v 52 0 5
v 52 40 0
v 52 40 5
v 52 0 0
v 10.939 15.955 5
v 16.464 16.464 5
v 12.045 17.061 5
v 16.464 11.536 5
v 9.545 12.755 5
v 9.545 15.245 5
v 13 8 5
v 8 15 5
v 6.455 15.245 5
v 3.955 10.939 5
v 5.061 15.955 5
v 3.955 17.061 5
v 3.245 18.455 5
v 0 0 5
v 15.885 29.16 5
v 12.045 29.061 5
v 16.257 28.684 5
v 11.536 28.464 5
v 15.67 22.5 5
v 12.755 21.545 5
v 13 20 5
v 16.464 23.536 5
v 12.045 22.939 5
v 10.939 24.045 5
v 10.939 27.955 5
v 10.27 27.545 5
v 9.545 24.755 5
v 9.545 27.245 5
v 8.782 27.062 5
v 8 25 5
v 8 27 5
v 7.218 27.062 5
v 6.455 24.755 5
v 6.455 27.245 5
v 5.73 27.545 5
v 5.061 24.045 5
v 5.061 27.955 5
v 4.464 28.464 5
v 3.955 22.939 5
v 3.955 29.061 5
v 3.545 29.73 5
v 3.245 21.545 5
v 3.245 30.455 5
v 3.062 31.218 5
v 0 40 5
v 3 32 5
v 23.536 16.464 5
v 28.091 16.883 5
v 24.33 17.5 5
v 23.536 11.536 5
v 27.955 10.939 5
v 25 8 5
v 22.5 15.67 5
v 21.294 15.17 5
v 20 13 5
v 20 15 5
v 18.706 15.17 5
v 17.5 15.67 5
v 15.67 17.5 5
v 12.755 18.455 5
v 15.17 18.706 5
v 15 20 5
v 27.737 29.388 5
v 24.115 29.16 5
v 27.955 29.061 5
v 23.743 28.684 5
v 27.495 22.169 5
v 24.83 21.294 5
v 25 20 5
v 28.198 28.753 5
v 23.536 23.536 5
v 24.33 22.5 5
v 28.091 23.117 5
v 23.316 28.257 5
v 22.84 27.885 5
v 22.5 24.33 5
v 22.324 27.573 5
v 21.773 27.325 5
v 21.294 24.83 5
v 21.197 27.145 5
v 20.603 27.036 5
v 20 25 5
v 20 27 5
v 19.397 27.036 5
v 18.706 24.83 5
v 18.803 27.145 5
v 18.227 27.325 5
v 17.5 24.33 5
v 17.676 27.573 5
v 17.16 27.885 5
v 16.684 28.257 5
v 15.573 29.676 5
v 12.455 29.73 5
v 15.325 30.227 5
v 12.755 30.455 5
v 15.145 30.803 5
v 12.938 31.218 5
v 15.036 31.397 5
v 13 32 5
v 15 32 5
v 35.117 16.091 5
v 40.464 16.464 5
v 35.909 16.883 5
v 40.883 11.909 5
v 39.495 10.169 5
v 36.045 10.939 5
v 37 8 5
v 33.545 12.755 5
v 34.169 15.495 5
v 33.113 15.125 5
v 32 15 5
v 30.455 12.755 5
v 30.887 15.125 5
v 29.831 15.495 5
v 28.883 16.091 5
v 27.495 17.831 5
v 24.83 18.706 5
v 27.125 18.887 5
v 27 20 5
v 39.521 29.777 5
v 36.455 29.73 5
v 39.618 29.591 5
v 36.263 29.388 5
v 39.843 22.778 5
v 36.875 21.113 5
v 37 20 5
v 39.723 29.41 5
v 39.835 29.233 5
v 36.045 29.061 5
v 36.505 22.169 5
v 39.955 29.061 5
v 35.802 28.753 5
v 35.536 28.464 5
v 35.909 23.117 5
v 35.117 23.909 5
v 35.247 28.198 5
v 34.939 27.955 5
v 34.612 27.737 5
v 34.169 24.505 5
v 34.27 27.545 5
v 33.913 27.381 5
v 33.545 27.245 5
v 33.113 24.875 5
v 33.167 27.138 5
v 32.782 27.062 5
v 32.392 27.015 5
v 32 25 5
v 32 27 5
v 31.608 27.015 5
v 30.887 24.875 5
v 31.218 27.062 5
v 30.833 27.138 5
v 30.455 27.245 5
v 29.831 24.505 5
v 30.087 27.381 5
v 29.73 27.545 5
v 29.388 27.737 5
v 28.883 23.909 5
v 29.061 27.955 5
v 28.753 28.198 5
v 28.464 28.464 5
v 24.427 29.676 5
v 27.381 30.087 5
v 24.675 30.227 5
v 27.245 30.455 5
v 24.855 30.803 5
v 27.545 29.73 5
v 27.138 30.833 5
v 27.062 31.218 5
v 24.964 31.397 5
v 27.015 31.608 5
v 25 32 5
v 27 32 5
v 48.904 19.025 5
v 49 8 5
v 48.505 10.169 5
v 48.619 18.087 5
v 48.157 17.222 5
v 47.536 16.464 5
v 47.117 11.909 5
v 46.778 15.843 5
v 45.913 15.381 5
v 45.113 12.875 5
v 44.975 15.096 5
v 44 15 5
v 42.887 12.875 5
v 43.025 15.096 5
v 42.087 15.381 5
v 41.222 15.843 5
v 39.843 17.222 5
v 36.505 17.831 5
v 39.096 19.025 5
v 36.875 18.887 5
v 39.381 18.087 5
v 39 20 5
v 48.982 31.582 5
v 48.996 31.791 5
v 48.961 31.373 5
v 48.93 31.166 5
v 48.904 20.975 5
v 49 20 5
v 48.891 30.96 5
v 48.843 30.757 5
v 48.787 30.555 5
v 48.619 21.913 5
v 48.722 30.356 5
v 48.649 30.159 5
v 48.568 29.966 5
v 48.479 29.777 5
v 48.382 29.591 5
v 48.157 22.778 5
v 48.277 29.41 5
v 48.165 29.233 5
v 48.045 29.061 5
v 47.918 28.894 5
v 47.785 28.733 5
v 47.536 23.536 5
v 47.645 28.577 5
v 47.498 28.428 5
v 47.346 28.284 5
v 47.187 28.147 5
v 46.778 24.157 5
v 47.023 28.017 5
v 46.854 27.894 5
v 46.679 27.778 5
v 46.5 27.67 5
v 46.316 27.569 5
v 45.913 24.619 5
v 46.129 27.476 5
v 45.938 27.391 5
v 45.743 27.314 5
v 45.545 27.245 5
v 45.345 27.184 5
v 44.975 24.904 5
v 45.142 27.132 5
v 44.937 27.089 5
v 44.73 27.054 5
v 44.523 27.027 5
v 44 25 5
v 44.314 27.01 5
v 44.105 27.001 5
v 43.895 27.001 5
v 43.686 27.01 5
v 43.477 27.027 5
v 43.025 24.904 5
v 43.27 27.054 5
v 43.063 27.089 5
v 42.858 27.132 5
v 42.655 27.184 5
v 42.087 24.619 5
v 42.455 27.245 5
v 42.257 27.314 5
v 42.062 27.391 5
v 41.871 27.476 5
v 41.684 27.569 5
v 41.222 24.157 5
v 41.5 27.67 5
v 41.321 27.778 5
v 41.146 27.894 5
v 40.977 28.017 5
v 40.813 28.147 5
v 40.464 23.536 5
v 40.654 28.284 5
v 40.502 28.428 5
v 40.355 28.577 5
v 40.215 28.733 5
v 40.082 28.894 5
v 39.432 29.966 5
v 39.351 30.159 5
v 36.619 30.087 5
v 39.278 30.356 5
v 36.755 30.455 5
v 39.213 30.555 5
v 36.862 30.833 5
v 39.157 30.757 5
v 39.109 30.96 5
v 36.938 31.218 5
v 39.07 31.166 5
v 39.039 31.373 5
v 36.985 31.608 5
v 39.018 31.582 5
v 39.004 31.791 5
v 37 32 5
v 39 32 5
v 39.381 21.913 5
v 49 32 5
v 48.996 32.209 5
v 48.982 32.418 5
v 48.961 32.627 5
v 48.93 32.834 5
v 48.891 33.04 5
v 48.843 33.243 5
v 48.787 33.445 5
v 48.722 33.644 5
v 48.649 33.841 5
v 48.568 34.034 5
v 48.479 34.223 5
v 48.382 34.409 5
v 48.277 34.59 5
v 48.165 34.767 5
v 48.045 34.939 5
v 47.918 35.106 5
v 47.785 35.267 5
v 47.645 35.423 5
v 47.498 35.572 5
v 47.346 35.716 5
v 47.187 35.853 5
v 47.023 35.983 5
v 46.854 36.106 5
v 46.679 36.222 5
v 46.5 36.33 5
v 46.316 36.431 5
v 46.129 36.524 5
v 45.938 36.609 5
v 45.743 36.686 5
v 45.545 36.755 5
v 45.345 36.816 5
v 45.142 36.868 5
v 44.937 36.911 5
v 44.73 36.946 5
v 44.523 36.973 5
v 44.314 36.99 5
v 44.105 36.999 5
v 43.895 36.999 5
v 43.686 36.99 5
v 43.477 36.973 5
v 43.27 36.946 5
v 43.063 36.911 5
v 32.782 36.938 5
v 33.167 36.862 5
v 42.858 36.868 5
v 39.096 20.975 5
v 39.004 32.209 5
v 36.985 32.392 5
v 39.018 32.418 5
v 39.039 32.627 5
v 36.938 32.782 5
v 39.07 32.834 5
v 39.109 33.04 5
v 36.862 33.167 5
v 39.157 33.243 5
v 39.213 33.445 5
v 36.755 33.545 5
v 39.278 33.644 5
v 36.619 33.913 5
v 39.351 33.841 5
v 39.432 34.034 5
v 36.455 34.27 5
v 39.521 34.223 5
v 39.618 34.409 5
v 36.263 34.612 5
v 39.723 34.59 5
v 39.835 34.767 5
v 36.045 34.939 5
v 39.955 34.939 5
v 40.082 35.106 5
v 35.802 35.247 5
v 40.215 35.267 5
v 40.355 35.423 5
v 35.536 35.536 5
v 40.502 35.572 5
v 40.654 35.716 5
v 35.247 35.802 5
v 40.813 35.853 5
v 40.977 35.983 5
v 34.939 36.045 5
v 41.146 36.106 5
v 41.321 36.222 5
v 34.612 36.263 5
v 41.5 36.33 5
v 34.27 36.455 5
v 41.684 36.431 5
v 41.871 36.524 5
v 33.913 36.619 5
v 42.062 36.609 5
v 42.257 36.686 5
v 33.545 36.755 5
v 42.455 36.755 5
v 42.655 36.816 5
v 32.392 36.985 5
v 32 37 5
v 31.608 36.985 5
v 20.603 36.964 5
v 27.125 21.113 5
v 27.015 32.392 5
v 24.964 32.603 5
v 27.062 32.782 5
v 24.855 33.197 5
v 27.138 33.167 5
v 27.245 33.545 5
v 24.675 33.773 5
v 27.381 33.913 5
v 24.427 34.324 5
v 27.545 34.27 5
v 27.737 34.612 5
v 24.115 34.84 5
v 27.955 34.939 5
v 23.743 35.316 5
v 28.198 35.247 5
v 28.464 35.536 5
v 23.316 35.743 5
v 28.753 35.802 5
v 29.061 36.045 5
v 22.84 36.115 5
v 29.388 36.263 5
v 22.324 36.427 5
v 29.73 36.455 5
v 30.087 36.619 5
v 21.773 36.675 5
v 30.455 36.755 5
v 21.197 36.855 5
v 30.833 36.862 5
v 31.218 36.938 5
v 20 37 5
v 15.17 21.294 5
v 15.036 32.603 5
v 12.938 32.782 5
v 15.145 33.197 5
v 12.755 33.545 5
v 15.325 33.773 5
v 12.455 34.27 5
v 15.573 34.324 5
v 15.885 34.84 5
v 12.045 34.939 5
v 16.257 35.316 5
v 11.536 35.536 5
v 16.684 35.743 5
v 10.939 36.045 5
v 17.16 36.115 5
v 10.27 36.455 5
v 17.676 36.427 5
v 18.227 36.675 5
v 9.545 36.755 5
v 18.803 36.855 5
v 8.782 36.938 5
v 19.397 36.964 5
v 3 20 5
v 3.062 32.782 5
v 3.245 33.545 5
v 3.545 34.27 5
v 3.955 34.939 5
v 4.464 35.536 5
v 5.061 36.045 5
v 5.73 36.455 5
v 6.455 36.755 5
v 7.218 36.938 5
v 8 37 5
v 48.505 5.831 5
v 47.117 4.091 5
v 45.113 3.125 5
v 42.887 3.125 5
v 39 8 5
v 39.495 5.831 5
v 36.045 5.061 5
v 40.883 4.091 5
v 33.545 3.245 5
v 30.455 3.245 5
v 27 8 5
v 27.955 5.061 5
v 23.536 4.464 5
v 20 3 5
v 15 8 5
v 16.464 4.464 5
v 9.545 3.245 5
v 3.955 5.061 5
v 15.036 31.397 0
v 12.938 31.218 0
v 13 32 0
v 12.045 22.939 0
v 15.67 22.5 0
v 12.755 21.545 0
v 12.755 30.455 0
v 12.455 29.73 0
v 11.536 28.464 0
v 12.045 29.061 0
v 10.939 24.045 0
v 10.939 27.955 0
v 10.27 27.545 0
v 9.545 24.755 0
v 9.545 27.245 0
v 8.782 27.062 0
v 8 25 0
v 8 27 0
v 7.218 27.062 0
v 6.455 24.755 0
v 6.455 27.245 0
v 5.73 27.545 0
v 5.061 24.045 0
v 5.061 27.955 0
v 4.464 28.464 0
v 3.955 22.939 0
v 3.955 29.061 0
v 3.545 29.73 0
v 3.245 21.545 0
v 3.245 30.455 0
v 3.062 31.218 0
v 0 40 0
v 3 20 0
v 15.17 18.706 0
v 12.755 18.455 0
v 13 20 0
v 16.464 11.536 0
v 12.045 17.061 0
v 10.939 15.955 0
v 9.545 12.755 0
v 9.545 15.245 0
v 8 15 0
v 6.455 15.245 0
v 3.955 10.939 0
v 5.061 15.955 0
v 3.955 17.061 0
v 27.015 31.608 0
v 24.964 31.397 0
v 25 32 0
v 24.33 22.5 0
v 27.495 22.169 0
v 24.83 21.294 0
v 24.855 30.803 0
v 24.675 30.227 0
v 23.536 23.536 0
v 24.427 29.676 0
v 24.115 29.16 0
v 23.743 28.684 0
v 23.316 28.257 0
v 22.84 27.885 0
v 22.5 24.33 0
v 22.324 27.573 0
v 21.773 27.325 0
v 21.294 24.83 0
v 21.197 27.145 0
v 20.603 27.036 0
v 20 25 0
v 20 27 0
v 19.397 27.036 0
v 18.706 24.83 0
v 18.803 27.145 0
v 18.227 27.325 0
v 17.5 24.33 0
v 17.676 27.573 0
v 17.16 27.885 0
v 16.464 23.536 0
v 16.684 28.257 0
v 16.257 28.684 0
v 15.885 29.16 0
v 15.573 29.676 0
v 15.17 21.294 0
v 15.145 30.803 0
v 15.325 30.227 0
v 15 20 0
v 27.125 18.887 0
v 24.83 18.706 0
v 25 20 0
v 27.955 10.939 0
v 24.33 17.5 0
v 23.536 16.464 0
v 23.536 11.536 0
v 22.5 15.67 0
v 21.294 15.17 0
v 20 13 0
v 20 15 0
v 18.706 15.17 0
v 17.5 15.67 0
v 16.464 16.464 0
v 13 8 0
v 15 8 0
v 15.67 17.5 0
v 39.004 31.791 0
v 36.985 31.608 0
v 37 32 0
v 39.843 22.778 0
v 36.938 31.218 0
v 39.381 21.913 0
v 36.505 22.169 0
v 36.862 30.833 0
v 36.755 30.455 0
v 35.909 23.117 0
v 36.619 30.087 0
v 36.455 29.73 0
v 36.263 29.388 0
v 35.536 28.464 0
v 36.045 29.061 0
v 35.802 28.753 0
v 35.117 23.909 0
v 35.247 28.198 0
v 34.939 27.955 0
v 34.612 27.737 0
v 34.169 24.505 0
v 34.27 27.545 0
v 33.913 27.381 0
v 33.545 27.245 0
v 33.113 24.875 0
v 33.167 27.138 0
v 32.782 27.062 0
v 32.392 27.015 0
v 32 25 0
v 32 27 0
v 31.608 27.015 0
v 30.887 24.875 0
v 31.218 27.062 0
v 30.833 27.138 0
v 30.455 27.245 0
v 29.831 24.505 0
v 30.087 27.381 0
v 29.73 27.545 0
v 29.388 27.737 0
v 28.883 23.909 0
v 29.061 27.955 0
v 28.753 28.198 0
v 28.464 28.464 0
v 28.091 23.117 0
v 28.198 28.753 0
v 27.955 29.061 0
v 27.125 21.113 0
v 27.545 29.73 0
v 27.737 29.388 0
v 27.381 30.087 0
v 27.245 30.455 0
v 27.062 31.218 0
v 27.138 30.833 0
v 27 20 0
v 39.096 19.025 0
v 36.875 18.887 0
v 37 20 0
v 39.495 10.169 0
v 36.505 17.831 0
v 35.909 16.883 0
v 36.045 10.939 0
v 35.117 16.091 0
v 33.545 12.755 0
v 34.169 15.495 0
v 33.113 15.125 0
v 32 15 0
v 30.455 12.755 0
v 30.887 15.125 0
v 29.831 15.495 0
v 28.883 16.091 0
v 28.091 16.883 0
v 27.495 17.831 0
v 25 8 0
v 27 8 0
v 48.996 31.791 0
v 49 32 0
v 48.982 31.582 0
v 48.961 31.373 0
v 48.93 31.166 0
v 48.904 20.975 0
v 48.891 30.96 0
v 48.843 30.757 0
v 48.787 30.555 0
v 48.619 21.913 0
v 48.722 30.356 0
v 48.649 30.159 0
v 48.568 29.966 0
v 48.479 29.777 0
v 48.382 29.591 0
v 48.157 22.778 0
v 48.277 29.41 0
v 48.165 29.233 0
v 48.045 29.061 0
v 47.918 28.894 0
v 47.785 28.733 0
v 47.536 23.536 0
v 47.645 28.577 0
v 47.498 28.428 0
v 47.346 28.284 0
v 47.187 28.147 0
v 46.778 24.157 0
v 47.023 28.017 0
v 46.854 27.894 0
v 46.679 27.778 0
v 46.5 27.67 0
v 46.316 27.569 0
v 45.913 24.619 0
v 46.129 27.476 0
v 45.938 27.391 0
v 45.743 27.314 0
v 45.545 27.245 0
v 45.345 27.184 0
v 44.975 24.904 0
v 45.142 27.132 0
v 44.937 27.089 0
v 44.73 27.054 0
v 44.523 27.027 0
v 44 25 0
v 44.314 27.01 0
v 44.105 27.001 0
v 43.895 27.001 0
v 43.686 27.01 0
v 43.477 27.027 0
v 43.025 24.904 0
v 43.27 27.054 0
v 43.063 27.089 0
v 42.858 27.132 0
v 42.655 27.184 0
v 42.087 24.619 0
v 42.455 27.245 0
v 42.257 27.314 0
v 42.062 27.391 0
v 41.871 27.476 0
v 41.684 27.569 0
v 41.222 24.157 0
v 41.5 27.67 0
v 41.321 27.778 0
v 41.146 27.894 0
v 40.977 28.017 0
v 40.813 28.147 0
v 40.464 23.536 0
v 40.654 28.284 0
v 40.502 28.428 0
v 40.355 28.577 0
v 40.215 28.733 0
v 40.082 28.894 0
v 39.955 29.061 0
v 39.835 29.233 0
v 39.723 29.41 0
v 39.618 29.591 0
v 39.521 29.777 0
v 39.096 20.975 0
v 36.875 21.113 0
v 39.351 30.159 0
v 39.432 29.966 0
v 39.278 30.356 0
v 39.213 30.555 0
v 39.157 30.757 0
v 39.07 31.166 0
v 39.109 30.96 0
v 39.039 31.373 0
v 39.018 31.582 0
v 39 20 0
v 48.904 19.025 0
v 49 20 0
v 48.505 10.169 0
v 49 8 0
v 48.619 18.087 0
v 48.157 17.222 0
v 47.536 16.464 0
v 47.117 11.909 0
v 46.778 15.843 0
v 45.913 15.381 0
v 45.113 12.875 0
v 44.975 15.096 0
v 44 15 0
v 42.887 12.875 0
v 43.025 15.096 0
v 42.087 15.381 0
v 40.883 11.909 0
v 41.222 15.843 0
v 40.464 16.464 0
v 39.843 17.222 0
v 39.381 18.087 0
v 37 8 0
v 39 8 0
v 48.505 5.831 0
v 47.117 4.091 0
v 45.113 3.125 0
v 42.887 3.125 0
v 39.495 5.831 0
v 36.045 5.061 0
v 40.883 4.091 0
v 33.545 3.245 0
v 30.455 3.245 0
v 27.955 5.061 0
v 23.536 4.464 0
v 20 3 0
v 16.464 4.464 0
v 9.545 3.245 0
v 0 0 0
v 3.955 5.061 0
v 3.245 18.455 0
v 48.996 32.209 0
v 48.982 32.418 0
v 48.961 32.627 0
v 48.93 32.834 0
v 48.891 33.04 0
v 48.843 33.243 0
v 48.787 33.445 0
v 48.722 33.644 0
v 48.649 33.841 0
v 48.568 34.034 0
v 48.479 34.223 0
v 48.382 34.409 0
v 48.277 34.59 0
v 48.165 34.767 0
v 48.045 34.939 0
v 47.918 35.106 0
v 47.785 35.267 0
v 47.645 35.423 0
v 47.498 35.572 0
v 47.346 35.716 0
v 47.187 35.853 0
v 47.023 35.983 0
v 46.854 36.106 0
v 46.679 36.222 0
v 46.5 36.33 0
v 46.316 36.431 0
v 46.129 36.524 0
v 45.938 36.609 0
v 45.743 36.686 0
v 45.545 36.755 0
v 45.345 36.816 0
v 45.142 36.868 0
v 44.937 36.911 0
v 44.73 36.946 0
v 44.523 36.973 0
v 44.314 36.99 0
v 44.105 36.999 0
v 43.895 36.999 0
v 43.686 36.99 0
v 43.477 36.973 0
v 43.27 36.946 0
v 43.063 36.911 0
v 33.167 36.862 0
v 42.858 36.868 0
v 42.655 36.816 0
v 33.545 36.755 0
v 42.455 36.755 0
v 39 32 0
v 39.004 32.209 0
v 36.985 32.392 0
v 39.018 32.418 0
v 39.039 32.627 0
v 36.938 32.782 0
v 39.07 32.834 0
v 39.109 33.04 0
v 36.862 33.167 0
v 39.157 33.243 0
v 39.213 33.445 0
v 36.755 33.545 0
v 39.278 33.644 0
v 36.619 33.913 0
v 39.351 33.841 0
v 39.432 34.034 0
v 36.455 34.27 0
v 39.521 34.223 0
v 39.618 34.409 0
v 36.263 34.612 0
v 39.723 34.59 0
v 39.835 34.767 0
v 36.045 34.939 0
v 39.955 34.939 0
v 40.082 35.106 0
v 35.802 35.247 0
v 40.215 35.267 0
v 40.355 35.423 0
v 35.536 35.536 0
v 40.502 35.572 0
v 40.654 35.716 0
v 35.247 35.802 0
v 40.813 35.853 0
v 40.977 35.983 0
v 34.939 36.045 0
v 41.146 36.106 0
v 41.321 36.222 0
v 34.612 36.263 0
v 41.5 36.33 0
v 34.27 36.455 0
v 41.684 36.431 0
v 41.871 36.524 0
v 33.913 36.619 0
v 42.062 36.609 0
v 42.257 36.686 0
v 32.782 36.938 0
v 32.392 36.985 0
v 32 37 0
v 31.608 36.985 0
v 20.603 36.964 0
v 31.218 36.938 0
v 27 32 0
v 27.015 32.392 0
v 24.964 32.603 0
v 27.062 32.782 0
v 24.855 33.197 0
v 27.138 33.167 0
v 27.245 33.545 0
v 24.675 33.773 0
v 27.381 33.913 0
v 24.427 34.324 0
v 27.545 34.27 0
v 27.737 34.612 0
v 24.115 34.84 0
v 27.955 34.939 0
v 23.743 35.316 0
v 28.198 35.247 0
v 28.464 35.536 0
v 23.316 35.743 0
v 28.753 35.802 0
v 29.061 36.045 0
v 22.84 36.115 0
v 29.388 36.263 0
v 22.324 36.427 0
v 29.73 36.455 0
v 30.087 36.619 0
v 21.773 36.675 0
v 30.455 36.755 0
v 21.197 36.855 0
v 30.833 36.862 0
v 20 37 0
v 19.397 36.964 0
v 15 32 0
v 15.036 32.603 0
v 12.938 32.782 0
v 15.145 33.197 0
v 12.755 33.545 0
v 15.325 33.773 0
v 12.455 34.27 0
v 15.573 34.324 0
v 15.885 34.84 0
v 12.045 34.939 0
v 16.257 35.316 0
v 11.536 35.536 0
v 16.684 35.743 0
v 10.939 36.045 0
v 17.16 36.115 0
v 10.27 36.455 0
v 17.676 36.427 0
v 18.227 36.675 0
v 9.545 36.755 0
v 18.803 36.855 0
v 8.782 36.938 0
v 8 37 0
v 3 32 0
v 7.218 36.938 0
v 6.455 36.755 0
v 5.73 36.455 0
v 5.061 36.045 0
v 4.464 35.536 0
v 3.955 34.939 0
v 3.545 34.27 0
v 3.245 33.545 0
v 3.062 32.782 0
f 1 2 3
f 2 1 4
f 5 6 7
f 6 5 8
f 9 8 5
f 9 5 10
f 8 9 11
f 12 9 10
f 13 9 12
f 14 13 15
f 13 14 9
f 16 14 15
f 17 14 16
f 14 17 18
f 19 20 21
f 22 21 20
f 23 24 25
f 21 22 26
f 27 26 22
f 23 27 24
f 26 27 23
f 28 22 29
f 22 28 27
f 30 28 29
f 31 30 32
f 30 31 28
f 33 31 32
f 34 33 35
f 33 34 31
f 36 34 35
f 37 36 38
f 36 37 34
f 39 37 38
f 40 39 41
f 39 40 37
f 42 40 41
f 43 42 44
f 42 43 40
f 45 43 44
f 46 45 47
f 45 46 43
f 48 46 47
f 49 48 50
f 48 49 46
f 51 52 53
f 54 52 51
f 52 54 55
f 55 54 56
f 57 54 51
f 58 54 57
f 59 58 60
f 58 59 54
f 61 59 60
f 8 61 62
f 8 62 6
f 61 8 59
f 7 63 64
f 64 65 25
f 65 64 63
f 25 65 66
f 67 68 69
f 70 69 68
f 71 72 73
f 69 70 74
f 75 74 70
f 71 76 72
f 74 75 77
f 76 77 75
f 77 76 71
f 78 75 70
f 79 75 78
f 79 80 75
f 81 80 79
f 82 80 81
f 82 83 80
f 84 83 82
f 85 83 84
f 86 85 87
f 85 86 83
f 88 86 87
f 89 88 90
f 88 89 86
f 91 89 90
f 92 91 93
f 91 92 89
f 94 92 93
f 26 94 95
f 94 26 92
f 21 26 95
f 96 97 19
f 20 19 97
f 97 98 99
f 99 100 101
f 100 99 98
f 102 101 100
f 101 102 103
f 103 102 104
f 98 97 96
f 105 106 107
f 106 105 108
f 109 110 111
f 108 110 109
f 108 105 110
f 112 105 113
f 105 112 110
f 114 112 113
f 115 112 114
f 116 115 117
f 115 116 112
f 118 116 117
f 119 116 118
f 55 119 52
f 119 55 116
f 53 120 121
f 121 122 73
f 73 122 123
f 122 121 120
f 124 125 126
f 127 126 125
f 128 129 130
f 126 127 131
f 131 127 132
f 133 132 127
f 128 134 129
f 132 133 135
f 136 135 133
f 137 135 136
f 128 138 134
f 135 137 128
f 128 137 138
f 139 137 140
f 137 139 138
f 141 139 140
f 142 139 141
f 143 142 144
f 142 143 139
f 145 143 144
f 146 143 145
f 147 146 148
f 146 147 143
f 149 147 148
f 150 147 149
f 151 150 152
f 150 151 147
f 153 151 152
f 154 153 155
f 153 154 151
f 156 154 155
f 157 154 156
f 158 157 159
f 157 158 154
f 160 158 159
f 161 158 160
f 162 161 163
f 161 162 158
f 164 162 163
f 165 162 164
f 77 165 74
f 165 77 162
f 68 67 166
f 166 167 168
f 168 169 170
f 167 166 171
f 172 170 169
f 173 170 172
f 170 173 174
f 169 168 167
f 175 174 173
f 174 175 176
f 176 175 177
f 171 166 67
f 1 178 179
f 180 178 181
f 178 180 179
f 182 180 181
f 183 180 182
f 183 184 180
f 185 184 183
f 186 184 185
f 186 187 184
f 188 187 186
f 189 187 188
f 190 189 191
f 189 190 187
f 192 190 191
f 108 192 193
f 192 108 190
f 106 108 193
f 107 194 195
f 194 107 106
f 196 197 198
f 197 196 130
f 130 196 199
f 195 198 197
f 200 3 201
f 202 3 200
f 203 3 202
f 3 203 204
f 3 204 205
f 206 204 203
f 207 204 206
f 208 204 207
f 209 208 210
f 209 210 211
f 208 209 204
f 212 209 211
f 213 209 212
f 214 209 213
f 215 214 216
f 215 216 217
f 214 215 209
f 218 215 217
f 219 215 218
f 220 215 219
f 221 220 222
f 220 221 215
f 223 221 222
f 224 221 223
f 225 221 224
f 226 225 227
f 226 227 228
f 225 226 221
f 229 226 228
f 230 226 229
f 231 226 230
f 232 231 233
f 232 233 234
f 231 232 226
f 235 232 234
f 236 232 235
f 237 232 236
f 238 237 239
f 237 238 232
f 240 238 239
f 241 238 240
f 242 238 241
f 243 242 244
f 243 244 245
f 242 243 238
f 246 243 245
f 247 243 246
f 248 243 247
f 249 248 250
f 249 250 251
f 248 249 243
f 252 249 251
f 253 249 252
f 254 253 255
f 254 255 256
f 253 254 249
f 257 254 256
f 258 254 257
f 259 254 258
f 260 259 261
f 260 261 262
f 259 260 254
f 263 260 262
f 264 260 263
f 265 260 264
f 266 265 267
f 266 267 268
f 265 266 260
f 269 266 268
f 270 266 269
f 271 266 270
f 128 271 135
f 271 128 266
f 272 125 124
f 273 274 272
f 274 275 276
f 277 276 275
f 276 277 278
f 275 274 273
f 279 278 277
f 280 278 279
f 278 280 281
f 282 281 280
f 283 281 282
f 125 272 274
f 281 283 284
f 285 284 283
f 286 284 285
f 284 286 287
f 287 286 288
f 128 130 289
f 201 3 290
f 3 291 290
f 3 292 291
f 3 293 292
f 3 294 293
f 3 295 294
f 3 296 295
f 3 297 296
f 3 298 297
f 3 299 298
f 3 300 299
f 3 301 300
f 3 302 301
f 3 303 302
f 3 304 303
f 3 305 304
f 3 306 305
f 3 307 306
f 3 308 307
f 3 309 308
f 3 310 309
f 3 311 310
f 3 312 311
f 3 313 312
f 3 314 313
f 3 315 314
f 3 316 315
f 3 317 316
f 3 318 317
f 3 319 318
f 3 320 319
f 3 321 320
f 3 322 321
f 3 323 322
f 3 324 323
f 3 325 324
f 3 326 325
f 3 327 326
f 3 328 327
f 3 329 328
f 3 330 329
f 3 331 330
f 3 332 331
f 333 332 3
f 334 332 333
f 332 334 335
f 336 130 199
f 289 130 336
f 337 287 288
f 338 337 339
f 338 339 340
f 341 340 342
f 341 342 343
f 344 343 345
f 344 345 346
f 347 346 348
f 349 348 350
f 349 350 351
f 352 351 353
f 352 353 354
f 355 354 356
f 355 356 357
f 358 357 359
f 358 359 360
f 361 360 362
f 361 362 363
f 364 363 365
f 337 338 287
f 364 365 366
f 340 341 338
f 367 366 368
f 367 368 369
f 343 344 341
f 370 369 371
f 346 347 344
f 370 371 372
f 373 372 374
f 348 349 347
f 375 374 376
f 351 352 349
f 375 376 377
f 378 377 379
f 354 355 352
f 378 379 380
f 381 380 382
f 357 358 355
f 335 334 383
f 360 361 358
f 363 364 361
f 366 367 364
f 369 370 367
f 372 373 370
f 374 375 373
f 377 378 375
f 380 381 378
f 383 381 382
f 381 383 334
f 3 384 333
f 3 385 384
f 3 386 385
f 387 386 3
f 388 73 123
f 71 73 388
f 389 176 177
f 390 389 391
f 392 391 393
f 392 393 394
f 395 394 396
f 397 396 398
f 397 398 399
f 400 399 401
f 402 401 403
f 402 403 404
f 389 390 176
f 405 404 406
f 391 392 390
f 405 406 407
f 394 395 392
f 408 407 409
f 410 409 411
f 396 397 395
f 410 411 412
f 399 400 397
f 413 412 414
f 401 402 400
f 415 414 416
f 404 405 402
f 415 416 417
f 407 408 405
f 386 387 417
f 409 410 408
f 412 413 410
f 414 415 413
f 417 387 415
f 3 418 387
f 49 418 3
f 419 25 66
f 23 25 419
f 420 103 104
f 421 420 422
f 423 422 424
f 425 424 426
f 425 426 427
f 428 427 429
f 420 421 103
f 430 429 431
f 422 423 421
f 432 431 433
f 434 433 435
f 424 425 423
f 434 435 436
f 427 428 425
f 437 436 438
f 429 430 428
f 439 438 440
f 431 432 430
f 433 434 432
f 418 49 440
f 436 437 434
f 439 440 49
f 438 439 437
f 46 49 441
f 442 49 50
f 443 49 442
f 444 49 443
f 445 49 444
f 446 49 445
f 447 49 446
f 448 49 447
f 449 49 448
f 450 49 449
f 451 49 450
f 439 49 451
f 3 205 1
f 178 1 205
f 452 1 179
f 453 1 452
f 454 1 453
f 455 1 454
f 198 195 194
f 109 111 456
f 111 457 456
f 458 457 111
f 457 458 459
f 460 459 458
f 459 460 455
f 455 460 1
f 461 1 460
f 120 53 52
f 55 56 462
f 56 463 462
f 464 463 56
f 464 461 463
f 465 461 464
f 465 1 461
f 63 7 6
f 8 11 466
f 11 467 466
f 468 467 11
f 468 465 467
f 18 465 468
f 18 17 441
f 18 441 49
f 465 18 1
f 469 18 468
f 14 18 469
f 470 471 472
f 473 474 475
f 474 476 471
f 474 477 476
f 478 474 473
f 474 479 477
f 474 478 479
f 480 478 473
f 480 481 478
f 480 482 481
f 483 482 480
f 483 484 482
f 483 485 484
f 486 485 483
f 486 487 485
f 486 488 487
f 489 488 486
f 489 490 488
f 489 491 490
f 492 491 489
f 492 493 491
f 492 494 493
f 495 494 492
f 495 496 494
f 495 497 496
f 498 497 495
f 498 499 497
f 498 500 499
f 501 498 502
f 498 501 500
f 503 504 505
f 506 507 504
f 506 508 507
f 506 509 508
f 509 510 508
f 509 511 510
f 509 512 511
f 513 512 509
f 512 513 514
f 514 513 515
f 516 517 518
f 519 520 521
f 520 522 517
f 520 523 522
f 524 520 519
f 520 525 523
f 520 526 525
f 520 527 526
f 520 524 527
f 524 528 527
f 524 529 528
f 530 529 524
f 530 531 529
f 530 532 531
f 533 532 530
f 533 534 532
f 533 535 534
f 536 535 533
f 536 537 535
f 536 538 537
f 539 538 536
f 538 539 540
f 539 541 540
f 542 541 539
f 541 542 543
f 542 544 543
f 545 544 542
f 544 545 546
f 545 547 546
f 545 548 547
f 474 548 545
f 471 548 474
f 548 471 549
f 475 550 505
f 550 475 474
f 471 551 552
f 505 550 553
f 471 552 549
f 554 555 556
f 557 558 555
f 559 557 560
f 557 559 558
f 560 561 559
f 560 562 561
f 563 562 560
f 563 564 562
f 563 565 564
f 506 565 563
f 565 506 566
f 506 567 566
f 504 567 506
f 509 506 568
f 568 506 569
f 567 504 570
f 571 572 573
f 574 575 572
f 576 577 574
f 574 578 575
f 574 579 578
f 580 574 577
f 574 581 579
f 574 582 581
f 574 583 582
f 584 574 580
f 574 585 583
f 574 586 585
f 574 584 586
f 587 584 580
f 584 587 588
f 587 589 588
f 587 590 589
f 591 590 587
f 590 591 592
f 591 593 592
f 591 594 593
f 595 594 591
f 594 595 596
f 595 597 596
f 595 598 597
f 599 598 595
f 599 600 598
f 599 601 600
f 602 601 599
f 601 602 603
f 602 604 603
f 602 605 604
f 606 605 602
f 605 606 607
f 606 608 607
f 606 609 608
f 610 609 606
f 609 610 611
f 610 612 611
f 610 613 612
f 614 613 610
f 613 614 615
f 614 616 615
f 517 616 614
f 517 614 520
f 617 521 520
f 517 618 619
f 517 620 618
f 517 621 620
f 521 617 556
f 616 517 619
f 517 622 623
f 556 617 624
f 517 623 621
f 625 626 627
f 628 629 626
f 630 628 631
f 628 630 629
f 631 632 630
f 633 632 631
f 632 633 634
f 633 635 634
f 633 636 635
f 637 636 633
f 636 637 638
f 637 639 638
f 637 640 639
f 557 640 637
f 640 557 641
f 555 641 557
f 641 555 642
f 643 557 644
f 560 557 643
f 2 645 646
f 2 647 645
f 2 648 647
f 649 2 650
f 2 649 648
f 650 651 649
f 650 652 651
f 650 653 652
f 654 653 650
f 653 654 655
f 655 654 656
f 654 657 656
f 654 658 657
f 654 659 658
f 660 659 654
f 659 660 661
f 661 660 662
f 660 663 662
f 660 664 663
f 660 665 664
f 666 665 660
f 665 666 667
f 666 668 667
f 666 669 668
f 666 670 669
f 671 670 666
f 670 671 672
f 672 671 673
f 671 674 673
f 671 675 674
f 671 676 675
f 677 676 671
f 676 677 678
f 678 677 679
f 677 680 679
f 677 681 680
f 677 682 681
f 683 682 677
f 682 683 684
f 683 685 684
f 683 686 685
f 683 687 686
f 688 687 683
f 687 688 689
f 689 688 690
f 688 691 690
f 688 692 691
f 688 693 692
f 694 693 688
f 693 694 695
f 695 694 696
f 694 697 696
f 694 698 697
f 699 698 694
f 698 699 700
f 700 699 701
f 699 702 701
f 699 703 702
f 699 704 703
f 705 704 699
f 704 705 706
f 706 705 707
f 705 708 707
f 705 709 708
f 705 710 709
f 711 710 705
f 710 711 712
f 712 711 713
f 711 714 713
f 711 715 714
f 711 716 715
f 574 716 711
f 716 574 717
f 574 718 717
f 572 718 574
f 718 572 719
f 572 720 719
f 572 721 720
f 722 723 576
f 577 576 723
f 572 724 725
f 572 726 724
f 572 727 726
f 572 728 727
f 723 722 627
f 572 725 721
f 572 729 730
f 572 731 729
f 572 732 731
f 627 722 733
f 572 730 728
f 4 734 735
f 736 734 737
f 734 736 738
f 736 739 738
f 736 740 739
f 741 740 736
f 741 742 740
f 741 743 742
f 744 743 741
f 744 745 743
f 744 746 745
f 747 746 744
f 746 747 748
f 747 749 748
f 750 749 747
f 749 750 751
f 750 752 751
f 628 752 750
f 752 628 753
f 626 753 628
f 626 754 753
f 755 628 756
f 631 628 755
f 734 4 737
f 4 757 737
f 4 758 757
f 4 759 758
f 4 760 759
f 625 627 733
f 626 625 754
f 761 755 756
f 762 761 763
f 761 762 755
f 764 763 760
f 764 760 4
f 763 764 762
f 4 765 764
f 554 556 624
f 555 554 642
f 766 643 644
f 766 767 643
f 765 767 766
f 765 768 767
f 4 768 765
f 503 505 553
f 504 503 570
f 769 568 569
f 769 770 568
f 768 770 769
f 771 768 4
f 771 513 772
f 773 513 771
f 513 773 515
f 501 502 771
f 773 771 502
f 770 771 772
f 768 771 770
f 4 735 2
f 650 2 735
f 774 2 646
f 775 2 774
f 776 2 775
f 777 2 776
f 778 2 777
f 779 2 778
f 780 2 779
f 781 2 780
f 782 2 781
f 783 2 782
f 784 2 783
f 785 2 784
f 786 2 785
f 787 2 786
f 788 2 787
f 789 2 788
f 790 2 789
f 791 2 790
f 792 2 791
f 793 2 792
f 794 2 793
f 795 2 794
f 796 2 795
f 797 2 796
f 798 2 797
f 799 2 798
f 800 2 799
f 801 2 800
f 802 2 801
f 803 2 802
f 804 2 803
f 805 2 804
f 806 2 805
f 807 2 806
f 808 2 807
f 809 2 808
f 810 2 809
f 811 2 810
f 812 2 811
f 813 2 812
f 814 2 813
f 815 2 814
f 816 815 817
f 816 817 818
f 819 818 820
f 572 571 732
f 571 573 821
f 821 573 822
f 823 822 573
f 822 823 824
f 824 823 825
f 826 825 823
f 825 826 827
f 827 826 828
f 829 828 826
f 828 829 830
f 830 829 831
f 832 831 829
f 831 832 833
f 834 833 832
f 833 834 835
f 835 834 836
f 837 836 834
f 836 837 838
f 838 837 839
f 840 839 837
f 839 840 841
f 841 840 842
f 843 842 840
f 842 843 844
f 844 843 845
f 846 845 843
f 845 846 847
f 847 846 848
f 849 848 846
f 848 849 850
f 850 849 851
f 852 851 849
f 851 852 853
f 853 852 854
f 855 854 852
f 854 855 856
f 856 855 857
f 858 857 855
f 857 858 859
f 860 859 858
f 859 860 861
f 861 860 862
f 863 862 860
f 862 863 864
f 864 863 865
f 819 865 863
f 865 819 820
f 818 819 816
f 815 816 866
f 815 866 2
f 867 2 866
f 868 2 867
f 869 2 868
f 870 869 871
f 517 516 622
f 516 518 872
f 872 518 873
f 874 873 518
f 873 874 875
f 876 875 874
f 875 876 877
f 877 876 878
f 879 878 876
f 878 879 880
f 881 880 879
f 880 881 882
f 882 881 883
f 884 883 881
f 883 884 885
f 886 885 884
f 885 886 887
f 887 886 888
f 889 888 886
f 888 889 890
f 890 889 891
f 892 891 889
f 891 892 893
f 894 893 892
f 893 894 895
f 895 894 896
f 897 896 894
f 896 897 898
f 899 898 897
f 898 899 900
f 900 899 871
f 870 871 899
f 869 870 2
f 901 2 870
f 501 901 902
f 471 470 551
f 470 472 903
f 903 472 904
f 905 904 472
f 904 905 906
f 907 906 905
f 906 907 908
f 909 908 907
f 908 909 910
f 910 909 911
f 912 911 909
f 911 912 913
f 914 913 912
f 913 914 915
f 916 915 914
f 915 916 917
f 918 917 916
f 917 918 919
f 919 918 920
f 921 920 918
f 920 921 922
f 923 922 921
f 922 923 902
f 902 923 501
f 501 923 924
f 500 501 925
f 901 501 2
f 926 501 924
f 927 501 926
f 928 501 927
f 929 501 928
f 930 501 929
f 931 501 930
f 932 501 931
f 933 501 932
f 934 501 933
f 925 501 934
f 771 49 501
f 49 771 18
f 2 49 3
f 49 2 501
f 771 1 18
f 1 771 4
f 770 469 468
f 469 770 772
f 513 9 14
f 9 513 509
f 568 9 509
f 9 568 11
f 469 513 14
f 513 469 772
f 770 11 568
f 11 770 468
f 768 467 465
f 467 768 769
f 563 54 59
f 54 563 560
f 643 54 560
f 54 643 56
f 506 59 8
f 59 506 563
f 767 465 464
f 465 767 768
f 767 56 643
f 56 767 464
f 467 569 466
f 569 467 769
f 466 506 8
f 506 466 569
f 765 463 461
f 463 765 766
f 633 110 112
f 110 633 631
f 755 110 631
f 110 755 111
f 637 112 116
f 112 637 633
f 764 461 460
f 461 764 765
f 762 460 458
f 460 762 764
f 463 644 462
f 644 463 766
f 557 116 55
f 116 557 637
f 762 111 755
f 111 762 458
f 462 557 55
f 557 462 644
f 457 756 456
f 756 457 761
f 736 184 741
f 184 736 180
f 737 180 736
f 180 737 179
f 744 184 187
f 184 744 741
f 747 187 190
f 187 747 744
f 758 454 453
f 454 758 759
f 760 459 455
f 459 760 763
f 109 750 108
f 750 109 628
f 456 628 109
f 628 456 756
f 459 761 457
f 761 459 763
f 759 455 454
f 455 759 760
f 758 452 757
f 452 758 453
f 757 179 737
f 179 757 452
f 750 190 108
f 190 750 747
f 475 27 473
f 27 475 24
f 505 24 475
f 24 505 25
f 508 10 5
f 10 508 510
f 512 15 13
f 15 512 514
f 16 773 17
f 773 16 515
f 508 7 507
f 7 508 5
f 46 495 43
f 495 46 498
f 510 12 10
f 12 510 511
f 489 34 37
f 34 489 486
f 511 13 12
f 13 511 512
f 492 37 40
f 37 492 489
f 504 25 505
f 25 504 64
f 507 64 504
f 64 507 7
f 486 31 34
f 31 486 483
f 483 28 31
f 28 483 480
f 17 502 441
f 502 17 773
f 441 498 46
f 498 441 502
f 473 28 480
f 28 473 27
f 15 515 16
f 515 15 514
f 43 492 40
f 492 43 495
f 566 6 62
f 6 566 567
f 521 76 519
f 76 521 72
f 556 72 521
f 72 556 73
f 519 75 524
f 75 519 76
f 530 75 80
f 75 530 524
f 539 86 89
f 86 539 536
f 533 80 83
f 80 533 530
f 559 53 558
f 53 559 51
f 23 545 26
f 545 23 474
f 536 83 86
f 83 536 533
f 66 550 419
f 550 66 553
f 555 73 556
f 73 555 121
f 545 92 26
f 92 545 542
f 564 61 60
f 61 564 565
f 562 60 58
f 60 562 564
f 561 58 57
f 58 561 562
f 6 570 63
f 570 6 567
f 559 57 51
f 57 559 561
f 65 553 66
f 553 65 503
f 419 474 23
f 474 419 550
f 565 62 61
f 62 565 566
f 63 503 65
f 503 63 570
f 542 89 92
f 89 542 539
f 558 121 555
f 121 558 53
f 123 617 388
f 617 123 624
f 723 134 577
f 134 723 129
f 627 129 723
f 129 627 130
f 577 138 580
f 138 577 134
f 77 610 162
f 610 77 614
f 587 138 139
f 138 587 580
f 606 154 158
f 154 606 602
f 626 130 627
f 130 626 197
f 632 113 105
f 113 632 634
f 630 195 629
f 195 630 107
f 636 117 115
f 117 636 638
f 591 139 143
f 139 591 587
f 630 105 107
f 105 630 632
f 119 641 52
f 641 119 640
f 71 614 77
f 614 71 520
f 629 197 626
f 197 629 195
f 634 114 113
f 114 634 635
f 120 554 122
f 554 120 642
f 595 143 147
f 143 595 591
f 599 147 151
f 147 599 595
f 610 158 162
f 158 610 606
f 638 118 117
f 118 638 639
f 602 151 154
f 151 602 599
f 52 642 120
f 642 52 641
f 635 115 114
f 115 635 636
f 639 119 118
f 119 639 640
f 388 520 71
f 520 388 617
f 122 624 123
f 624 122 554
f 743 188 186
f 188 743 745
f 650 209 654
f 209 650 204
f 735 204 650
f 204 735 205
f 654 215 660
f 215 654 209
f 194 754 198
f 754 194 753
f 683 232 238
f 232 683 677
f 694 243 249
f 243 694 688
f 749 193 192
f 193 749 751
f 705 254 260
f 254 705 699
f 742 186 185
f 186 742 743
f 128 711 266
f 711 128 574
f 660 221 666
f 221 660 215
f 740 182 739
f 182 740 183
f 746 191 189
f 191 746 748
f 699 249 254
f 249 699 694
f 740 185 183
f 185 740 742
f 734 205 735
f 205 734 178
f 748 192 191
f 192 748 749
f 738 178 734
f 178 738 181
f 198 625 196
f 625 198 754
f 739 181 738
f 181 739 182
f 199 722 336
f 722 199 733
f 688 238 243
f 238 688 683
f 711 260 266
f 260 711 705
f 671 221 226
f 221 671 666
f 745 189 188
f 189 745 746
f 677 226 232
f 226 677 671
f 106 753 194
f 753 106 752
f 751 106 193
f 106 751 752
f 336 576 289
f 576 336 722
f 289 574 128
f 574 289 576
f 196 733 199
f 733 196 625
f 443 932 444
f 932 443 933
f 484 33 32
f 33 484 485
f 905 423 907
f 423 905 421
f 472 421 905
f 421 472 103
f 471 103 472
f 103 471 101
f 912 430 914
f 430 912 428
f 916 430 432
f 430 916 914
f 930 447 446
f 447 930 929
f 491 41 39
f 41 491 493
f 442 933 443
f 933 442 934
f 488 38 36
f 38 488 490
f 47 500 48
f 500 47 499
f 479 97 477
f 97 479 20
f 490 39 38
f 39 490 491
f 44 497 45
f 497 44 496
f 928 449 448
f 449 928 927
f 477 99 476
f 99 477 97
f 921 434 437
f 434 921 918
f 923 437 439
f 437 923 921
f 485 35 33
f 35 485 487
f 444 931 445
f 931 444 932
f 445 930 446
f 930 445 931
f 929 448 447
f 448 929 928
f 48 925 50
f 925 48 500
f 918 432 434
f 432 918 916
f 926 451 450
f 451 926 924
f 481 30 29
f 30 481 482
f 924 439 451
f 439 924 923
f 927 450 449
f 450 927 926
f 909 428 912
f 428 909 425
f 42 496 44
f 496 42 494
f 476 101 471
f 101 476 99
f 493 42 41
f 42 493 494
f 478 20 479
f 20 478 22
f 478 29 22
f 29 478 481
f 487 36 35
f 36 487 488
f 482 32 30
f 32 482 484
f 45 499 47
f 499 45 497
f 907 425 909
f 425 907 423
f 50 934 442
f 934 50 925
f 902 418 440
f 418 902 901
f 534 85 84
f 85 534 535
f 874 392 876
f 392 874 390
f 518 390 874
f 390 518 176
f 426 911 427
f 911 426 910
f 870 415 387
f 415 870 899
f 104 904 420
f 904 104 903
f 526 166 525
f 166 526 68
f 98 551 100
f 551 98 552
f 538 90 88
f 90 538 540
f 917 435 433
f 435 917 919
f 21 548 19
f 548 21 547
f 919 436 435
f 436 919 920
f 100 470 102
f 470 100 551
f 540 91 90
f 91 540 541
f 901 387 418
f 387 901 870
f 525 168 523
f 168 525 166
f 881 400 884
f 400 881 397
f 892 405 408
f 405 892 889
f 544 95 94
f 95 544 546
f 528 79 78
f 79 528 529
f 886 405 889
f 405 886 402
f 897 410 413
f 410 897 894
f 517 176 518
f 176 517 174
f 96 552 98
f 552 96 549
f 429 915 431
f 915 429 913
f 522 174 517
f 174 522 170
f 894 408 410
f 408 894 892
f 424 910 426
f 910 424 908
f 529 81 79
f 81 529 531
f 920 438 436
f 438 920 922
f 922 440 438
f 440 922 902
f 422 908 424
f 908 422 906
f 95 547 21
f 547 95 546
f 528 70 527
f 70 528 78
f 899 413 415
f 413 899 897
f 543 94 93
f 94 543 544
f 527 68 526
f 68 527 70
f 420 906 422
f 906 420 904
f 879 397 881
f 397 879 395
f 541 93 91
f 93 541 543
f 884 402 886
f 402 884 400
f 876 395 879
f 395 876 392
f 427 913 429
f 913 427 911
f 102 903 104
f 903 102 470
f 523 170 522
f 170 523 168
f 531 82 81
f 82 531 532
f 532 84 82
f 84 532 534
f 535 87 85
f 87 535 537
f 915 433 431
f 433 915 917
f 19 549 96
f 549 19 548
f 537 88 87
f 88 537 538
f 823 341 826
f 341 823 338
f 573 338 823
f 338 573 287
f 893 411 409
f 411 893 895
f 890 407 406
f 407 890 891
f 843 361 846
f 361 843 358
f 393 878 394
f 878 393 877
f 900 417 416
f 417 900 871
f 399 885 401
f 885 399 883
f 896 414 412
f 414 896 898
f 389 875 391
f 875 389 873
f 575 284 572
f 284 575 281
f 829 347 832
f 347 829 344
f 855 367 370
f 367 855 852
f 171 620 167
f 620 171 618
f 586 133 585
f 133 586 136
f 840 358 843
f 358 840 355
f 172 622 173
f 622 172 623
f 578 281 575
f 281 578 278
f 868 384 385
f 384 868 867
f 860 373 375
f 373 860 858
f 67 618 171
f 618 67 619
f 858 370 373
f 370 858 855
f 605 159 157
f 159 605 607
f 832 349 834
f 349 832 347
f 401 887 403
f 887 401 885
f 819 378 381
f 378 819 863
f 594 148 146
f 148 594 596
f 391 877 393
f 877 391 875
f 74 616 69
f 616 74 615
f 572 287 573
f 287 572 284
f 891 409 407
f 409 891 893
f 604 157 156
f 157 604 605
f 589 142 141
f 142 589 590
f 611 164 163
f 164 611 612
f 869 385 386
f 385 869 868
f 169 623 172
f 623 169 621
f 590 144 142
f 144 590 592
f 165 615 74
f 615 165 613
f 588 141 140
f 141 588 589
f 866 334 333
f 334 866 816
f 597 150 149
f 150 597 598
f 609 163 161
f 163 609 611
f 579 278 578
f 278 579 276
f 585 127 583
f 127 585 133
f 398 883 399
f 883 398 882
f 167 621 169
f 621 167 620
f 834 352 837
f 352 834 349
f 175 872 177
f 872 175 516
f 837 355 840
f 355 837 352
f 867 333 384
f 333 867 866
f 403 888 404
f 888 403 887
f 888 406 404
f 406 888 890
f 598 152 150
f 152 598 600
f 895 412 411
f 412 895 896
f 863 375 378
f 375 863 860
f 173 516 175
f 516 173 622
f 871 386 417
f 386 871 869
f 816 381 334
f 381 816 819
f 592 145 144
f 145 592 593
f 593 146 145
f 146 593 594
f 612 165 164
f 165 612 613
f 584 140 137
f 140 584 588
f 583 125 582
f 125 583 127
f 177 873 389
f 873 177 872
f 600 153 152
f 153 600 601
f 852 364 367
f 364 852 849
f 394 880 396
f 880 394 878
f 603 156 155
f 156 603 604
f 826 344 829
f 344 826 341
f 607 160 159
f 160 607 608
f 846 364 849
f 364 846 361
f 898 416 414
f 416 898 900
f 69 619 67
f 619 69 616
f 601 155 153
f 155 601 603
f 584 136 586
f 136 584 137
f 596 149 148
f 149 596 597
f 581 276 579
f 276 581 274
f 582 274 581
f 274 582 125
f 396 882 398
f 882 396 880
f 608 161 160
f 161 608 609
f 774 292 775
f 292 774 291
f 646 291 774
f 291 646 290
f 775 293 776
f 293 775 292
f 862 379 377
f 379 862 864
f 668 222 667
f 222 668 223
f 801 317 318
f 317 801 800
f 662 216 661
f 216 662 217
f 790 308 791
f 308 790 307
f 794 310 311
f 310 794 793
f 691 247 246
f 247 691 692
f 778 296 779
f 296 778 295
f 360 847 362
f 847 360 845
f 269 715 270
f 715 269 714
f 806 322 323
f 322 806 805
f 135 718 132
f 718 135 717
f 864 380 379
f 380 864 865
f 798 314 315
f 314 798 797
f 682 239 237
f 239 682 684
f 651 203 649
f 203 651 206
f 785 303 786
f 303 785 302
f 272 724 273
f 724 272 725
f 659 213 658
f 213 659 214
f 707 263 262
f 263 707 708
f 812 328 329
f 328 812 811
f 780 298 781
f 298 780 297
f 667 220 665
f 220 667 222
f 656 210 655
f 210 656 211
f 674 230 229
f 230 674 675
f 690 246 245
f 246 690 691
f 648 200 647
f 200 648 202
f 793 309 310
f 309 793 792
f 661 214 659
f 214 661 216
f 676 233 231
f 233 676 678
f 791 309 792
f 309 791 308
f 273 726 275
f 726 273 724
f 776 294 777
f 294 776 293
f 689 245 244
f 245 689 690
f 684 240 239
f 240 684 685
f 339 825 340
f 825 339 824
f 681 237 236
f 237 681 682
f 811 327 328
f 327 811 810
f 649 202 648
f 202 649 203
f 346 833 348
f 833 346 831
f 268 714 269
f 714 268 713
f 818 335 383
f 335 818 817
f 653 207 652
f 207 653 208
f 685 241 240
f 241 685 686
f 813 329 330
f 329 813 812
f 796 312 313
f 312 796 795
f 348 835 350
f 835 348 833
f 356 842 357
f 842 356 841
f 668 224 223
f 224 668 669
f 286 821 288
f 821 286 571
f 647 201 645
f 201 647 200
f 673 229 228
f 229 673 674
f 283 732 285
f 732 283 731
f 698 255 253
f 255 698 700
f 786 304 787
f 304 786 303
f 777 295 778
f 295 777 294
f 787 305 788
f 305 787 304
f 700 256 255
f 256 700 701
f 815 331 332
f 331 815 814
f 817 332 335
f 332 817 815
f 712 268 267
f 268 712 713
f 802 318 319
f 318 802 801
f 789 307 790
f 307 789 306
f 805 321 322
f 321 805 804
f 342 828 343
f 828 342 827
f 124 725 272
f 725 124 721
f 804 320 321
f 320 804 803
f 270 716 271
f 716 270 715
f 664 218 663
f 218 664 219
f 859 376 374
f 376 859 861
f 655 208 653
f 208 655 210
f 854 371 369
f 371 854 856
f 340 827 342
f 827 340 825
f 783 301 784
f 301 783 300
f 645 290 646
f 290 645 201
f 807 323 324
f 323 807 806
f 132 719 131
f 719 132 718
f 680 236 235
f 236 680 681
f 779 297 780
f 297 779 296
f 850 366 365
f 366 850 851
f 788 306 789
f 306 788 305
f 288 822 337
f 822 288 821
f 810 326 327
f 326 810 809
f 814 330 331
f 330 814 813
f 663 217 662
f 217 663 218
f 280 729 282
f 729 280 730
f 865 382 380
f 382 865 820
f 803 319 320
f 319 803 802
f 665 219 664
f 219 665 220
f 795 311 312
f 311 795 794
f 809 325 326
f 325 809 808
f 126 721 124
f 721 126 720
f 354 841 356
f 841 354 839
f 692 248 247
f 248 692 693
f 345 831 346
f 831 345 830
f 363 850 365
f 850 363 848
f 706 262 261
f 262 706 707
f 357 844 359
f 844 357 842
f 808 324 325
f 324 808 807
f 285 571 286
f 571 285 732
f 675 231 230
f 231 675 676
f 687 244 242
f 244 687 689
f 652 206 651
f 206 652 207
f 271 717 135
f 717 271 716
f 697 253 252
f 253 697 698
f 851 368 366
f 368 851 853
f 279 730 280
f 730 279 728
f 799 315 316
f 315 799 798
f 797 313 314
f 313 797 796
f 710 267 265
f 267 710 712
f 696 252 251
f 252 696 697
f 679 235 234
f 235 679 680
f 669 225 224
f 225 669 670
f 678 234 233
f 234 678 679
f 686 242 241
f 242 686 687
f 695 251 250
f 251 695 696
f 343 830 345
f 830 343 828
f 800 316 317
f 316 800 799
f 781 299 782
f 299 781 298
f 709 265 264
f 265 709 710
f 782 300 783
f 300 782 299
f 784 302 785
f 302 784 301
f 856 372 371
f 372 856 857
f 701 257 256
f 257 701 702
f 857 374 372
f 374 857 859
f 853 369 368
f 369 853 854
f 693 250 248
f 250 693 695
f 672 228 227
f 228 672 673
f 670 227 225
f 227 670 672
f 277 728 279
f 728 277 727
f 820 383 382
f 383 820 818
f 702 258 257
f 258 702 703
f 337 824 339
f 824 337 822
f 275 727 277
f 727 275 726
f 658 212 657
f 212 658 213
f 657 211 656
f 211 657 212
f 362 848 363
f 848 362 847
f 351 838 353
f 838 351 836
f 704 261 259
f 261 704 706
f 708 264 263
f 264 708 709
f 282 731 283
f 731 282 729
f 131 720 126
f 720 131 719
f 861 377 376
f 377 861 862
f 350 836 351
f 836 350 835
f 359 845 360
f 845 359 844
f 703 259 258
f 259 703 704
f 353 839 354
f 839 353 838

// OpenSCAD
difference() {
cube([52, 40, 5]);

translate([8,8,0]) cylinder(r=5, h=10, $fn=5);

translate([20,8,0]) cylinder(r=5, h=10, $fn=8);

translate([32,8,0]) cylinder(r=5, h=10, $fn=10);

translate([44,8,0]) cylinder(r=5, h=10, $fn=14);

translate([8,20,0]) cylinder(r=5, h=10, $fn=20);

translate([20,20,0]) cylinder(r=5, h=10, $fn=24);

translate([32,20,0]) cylinder(r=5, h=10, $fn=28);

translate([44,20,0]) cylinder(r=5, h=10, $fn=32);

translate([8,32,0]) cylinder(r=5, h=10, $fn=40);

translate([20,32,0]) cylinder(r=5, h=10, $fn=52);

translate([32,32,0]) cylinder(r=5, h=10, $fn=80);

translate([44,32,0]) cylinder(r=5, h=10, $fn=150);
}
